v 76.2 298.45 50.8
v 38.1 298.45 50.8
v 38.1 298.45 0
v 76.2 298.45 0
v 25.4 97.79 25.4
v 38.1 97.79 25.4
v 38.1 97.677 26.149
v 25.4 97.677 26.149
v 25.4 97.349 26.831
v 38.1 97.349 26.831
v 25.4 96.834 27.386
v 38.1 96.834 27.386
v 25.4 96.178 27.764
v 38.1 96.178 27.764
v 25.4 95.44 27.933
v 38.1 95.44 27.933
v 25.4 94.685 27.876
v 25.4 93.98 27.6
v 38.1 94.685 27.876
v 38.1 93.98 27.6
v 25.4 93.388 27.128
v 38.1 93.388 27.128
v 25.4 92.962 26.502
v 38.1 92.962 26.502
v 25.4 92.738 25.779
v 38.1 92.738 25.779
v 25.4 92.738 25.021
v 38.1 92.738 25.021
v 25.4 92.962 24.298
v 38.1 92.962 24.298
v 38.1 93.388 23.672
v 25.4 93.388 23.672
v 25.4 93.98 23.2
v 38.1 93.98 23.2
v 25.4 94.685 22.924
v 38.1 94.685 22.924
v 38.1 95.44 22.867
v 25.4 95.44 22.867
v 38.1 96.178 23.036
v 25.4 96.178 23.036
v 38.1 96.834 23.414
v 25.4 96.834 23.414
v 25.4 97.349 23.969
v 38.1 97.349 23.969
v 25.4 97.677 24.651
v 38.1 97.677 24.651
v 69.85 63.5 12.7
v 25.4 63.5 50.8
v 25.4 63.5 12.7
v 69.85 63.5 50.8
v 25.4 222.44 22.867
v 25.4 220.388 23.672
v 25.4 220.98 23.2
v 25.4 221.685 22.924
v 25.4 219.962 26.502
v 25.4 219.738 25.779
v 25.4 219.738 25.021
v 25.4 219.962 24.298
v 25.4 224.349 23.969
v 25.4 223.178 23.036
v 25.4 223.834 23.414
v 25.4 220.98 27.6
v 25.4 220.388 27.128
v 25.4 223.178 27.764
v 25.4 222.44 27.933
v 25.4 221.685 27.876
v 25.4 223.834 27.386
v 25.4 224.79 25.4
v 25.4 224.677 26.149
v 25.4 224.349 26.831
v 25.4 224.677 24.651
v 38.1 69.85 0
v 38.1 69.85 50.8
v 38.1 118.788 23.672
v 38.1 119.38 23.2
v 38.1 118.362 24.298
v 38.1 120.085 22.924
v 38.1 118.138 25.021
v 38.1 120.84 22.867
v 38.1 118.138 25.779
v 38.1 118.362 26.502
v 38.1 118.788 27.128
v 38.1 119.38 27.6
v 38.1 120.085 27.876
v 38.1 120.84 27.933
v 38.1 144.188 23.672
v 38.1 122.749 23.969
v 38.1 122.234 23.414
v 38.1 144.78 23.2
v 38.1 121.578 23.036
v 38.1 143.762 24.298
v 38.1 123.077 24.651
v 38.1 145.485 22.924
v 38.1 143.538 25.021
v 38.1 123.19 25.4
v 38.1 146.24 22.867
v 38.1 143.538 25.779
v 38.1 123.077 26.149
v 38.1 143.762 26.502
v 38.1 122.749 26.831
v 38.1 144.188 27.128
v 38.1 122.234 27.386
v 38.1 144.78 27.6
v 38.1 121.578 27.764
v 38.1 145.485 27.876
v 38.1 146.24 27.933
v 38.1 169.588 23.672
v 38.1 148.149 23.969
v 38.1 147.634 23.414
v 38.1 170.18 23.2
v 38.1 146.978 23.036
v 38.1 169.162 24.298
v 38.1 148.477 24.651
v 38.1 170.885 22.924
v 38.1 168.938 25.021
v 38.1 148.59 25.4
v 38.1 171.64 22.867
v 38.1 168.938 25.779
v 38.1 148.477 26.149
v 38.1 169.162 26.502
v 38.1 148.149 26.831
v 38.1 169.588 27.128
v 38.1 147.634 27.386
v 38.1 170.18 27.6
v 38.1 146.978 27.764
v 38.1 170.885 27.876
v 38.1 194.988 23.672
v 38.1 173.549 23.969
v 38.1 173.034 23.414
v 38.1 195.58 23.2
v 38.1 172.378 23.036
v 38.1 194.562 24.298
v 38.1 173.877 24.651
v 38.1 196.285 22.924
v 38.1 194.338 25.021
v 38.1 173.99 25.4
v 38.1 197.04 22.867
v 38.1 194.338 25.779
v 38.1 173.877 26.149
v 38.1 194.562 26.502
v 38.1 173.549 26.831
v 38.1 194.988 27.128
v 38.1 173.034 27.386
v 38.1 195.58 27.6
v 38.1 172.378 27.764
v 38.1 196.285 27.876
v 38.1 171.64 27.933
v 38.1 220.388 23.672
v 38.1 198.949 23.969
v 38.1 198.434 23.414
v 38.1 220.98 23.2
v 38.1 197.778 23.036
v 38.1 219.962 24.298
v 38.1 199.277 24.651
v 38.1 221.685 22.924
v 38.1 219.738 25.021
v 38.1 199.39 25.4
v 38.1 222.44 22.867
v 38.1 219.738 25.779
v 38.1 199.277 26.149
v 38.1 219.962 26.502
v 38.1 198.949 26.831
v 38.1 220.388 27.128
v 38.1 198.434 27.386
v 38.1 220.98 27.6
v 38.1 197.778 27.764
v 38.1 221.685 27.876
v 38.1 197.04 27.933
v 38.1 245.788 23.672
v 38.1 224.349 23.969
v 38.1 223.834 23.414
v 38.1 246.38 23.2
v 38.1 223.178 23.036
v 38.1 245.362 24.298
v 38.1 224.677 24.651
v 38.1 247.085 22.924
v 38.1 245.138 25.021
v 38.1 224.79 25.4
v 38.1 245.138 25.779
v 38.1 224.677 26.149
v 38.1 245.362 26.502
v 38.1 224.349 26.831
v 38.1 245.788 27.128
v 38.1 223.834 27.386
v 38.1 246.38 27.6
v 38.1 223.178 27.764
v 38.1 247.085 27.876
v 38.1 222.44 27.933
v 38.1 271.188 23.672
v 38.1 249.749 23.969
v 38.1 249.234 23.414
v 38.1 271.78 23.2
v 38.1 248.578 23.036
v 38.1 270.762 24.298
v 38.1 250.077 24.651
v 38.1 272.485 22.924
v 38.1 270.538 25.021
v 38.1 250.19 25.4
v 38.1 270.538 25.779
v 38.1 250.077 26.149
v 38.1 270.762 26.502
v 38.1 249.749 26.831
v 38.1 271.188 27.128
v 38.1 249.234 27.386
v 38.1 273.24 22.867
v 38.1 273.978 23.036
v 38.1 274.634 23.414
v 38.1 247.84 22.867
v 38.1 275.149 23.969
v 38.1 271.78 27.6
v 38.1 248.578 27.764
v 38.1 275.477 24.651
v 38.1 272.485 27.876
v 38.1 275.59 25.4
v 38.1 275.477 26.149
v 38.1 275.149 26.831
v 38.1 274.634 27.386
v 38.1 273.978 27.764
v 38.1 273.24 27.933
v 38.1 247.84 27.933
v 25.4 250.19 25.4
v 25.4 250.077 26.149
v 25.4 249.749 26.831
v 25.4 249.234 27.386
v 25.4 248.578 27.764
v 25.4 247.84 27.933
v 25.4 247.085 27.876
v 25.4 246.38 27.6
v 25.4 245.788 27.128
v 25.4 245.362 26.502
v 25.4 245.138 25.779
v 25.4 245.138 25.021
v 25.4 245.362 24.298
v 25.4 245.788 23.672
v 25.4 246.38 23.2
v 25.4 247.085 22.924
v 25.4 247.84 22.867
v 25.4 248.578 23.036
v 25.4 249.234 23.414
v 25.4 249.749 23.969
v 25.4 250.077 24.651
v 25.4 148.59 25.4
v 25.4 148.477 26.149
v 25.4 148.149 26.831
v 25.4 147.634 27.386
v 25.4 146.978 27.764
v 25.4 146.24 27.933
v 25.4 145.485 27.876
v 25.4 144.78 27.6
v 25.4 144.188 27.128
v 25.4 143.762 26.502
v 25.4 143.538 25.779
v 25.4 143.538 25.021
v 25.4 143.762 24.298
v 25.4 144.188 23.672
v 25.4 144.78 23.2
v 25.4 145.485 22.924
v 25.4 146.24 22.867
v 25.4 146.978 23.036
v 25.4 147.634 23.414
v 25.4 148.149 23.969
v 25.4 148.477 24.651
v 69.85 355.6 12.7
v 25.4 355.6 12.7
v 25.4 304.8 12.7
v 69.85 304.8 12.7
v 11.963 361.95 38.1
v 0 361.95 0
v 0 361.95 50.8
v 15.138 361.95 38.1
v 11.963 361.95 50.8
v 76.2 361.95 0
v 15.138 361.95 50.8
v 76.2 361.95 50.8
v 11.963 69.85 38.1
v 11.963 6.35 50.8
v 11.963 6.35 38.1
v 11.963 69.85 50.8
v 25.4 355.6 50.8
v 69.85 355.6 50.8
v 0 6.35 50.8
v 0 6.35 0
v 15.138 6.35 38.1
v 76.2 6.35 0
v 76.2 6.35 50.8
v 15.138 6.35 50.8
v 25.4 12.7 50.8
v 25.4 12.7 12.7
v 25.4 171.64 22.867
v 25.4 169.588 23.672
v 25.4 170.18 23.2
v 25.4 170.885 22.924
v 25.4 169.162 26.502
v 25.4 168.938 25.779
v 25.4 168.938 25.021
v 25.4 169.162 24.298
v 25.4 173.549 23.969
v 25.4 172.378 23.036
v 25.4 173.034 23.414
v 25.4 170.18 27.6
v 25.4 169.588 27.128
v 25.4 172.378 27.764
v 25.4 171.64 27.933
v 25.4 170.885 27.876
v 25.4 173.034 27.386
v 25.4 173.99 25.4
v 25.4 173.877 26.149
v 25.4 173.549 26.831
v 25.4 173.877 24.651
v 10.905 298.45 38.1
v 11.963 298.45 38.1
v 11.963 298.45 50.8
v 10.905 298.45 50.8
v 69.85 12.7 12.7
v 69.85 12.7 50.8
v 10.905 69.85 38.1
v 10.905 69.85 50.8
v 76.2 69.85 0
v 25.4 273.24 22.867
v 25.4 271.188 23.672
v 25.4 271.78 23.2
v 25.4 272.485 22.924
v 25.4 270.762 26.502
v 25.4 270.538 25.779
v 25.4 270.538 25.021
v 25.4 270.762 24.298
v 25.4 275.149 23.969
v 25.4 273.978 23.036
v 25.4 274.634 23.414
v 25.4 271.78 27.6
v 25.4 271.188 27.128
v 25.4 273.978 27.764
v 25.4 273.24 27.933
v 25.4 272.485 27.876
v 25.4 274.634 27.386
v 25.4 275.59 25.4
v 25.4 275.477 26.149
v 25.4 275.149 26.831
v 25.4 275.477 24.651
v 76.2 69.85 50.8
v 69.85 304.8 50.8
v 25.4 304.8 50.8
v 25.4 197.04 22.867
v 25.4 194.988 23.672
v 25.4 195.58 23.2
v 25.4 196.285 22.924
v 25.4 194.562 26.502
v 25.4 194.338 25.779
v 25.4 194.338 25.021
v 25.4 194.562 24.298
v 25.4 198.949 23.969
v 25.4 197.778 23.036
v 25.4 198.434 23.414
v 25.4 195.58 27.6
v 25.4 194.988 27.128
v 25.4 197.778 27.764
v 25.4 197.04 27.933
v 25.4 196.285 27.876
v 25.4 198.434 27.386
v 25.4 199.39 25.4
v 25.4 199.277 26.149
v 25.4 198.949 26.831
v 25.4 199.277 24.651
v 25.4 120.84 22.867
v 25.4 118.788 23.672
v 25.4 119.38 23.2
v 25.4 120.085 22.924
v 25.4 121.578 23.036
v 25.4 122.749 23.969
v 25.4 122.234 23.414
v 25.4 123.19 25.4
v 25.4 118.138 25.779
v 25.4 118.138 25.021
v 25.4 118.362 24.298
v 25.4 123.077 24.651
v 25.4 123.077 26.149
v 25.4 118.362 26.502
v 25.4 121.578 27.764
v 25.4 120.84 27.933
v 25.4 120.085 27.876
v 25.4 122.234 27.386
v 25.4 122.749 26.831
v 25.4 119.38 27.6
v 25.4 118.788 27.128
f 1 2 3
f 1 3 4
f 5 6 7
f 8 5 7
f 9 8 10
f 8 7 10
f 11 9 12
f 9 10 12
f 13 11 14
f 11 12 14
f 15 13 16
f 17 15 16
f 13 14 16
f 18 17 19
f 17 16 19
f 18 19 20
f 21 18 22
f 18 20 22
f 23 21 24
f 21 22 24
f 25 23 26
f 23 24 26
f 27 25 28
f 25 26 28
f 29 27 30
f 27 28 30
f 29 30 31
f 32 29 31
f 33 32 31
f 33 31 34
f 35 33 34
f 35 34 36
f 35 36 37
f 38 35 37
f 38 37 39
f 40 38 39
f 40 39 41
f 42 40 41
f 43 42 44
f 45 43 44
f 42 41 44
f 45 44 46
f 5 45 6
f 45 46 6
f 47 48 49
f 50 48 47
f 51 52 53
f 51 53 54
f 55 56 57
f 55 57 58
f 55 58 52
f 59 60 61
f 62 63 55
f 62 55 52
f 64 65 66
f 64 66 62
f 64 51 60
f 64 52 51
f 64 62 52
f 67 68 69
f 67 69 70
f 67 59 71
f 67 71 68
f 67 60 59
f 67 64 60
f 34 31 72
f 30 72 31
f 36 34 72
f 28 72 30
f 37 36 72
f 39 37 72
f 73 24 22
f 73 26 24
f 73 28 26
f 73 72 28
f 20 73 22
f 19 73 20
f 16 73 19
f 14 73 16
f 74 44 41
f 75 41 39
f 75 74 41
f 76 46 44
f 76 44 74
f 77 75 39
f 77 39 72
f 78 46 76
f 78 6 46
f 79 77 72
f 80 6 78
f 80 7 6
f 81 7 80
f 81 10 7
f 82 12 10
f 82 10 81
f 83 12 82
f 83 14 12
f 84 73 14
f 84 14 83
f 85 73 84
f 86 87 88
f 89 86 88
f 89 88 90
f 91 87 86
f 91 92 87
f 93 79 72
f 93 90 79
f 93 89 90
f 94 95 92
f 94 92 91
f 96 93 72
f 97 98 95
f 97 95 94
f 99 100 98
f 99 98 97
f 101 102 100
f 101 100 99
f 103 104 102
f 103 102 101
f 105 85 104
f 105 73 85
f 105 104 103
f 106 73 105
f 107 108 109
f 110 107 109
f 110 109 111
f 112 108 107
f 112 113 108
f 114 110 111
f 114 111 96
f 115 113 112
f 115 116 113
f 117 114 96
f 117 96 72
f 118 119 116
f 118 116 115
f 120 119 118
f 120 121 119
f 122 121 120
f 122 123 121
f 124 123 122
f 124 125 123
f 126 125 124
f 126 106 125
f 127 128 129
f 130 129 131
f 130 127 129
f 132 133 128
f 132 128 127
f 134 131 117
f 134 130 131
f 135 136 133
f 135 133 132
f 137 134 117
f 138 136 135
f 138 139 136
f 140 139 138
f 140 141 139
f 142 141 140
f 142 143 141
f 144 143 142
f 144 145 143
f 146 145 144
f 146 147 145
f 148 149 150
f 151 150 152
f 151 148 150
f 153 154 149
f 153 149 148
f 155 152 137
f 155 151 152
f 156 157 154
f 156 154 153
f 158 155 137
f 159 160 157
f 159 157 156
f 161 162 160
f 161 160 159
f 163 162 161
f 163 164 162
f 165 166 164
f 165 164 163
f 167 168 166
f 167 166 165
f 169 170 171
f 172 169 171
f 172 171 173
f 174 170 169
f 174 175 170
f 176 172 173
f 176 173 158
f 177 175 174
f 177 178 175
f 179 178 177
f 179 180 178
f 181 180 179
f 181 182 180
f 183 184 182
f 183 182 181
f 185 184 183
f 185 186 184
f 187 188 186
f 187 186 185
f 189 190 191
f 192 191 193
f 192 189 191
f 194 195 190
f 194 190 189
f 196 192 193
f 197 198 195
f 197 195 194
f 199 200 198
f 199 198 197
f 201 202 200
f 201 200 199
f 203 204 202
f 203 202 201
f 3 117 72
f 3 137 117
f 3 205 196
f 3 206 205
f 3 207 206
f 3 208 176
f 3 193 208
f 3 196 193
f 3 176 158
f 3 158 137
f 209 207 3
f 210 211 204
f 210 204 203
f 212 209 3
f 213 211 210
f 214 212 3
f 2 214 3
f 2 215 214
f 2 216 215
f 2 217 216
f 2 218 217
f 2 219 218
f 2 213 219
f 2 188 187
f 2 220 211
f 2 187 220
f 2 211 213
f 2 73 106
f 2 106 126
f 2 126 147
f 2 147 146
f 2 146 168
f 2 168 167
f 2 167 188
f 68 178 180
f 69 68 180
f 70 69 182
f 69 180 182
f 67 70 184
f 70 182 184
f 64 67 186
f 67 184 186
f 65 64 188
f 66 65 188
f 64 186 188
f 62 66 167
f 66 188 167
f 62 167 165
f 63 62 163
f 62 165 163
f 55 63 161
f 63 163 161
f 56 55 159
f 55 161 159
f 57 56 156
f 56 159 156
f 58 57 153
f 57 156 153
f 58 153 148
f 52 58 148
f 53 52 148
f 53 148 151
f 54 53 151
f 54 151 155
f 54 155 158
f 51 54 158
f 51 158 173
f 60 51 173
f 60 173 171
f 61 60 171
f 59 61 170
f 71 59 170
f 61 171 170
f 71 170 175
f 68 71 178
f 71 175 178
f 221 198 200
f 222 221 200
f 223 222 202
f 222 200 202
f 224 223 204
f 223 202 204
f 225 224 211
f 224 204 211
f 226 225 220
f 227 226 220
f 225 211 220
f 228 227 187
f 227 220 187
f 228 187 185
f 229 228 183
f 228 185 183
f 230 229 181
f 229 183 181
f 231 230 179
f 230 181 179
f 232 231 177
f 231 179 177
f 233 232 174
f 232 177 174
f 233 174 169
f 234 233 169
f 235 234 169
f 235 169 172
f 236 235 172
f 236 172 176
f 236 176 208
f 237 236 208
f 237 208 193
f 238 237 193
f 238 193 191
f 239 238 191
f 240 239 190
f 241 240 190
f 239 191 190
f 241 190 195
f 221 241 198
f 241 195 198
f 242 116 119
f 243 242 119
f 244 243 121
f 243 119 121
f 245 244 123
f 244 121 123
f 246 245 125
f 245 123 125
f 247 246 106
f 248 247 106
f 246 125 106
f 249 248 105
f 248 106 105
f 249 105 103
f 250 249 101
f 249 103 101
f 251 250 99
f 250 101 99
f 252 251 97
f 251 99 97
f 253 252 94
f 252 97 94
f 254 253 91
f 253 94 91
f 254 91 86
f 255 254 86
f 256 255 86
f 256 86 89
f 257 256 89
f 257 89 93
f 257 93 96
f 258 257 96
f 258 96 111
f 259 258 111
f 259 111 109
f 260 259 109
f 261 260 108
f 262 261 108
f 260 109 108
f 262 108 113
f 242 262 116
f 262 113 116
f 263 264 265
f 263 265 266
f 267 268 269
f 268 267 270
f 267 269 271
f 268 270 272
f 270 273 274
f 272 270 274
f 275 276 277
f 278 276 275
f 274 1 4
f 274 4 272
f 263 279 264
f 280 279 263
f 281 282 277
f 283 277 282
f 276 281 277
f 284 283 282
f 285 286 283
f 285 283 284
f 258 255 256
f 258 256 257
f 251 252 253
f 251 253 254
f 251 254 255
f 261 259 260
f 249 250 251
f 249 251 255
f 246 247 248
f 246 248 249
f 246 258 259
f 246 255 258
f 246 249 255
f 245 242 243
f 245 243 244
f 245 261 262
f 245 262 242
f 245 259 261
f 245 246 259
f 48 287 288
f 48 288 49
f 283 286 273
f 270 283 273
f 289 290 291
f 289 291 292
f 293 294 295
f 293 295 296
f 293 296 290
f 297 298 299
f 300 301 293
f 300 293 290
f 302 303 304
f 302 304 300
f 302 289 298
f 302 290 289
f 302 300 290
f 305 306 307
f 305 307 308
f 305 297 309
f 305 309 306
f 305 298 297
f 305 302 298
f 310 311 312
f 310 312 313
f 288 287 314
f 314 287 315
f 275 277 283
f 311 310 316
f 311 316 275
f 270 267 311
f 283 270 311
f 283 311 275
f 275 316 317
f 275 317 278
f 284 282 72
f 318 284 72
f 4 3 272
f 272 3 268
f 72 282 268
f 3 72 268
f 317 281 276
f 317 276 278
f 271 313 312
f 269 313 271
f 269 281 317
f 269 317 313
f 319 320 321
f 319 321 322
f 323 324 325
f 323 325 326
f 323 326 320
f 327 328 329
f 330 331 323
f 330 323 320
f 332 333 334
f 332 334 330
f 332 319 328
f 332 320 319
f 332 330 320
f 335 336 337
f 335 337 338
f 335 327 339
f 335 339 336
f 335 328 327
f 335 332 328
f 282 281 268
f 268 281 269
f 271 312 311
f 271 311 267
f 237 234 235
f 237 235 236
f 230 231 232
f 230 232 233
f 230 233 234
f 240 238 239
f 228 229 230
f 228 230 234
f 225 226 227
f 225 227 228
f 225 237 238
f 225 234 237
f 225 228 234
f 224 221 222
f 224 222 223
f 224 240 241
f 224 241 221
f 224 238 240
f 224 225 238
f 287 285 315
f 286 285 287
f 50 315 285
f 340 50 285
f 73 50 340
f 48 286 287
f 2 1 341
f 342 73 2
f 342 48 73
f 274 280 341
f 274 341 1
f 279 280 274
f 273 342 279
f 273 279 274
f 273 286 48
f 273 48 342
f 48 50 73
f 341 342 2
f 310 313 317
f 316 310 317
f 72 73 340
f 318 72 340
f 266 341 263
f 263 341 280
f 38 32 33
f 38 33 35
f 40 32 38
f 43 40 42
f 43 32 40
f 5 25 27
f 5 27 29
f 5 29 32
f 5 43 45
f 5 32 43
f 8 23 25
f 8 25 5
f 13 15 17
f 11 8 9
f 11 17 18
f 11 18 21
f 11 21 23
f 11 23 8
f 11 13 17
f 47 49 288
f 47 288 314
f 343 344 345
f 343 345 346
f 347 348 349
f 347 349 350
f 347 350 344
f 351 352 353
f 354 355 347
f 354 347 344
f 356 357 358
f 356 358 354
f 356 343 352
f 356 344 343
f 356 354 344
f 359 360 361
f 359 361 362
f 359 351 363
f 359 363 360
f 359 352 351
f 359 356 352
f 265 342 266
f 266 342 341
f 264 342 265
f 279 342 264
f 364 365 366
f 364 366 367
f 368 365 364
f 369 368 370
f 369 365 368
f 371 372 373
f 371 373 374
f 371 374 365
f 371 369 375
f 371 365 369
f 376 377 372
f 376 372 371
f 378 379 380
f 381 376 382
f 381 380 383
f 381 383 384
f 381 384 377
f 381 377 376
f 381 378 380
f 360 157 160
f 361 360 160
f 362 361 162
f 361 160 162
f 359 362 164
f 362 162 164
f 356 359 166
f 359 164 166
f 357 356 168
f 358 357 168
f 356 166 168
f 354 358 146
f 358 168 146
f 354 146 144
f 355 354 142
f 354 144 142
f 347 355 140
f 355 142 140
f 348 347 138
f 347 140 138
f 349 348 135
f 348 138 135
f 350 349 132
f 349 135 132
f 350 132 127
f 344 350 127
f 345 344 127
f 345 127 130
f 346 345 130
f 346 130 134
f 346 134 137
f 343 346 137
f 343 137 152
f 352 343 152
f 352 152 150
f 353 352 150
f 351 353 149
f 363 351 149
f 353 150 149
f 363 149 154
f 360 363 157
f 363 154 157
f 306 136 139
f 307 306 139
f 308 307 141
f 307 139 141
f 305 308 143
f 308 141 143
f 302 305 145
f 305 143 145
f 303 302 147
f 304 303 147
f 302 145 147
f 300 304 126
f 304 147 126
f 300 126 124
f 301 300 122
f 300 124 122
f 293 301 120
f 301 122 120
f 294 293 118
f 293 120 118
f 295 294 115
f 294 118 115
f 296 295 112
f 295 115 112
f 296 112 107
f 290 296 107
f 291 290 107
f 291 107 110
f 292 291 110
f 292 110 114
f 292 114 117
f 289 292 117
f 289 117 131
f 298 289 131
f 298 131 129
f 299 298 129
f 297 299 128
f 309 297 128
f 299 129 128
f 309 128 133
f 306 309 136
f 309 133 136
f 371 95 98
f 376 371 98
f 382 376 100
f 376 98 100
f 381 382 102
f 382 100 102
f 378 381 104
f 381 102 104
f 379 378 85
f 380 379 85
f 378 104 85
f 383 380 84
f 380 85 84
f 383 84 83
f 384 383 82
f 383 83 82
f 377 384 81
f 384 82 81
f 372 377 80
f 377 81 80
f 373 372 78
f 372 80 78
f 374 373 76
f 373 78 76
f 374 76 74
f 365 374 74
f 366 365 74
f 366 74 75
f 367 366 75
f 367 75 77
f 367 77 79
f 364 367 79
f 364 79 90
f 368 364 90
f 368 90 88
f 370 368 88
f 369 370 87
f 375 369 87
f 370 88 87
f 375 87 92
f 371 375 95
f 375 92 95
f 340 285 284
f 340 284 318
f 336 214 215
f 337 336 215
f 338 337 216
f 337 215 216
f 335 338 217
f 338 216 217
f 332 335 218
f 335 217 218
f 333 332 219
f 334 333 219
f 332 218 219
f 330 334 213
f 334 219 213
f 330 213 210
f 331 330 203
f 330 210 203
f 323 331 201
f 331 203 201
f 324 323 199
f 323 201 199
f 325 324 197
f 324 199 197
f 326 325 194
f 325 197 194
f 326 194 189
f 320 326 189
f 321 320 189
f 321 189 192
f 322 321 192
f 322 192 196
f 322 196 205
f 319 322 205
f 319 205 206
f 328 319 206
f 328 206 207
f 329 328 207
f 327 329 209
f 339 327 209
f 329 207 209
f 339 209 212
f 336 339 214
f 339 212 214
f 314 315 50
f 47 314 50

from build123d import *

# Parameters (mm, degrees)
F0_W      = 368.3
F0_H      = 50.8
F1_DEPTH  = 38.1
F2_W      = 76.2
F2_H      = 50.8
F3_DEPTH  = 38.1
F4_W      = 3.175
F4_H      = 63.5
F5_DEPTH  = 12.7
F6_W      = 44.45
F6_H      = 50.8
F7_DEPTH  = 38.1
F8_R      = 2.54
F9_DEPTH  = 12.7
F10_W     = 76.2
F10_H     = 6.35
F10_W_2   = 38.1
F11_DEPTH = 76.2


with BuildPart() as f1:
    # F0 (on Right) → F1 (new body)
    with BuildSketch(Plane.YZ):
        with Locations((184.15, 25.4)):
            Rectangle(F0_W, F0_H)
    extrude(amount=F1_DEPTH)

    # F2 (on face) → F3 (join)
    with BuildSketch(Plane.YZ.offset(38.1)):
        with Locations((38.1, 25.4)):
            Rectangle(F2_W, F2_H)
        with Locations((330.2, 25.4)):
            Rectangle(F2_W, F2_H)
    extrude(amount=F3_DEPTH)

    # F4 (on face) → F5 (cut)
    with BuildSketch(Plane.XY.offset(50.8)):
        with Locations((13.5509, 38.1)):
            Rectangle(F4_W, F4_H)
        with Locations((13.5509, 330.2)):
            Rectangle(F4_W, F4_H)
        Polygon((10.905067, 69.85), (11.9634, 69.85), (15.1384, 69.85), (15.1384, 298.45), (11.9634, 298.45), (10.905067, 298.45), align=None)
    extrude(amount=-F5_DEPTH, mode=Mode.SUBTRACT)

    # F6 (on face) → F7 (cut)
    with BuildSketch(Plane.XY.offset(50.8)):
        with Locations((47.625, 38.1)):
            Rectangle(F6_W, F6_H)
        with Locations((47.625, 330.2)):
            Rectangle(F6_W, F6_H)
    extrude(amount=-F7_DEPTH, mode=Mode.SUBTRACT)

    # F8 (on face) → F9 (cut)
    with BuildSketch(Plane.YZ.offset(38.1)):
        with Locations((120.65, 25.4)):
            Circle(F8_R)
        with Locations((146.05, 25.4)):
            Circle(F8_R)
        with Locations((171.45, 25.4)):
            Circle(F8_R)
        with Locations((196.85, 25.4)):
            Circle(F8_R)
        with Locations((222.25, 25.4)):
            Circle(F8_R)
        with Locations((247.65, 25.4)):
            Circle(F8_R)
        with Locations((95.25, 25.4)):
            Circle(F8_R)
        with Locations((273.05, 25.4)):
            Circle(F8_R)
    extrude(amount=-F9_DEPTH, mode=Mode.SUBTRACT)

    # F10 (on face) → F11 (cut)
    with BuildSketch(Plane.XY.offset(50.8)):
        with Locations((38.1, 3.175)):
            Rectangle(F10_W, F10_H)
        with Locations((57.15, 73.025)):
            Rectangle(F10_W_2, F10_H)
        with Locations((38.1, 365.125)):
            Rectangle(F10_W, F10_H)
        with Locations((57.15, 295.275)):
            Rectangle(F10_W_2, F10_H)
    extrude(amount=-F11_DEPTH, mode=Mode.SUBTRACT)


solid = f1.part
